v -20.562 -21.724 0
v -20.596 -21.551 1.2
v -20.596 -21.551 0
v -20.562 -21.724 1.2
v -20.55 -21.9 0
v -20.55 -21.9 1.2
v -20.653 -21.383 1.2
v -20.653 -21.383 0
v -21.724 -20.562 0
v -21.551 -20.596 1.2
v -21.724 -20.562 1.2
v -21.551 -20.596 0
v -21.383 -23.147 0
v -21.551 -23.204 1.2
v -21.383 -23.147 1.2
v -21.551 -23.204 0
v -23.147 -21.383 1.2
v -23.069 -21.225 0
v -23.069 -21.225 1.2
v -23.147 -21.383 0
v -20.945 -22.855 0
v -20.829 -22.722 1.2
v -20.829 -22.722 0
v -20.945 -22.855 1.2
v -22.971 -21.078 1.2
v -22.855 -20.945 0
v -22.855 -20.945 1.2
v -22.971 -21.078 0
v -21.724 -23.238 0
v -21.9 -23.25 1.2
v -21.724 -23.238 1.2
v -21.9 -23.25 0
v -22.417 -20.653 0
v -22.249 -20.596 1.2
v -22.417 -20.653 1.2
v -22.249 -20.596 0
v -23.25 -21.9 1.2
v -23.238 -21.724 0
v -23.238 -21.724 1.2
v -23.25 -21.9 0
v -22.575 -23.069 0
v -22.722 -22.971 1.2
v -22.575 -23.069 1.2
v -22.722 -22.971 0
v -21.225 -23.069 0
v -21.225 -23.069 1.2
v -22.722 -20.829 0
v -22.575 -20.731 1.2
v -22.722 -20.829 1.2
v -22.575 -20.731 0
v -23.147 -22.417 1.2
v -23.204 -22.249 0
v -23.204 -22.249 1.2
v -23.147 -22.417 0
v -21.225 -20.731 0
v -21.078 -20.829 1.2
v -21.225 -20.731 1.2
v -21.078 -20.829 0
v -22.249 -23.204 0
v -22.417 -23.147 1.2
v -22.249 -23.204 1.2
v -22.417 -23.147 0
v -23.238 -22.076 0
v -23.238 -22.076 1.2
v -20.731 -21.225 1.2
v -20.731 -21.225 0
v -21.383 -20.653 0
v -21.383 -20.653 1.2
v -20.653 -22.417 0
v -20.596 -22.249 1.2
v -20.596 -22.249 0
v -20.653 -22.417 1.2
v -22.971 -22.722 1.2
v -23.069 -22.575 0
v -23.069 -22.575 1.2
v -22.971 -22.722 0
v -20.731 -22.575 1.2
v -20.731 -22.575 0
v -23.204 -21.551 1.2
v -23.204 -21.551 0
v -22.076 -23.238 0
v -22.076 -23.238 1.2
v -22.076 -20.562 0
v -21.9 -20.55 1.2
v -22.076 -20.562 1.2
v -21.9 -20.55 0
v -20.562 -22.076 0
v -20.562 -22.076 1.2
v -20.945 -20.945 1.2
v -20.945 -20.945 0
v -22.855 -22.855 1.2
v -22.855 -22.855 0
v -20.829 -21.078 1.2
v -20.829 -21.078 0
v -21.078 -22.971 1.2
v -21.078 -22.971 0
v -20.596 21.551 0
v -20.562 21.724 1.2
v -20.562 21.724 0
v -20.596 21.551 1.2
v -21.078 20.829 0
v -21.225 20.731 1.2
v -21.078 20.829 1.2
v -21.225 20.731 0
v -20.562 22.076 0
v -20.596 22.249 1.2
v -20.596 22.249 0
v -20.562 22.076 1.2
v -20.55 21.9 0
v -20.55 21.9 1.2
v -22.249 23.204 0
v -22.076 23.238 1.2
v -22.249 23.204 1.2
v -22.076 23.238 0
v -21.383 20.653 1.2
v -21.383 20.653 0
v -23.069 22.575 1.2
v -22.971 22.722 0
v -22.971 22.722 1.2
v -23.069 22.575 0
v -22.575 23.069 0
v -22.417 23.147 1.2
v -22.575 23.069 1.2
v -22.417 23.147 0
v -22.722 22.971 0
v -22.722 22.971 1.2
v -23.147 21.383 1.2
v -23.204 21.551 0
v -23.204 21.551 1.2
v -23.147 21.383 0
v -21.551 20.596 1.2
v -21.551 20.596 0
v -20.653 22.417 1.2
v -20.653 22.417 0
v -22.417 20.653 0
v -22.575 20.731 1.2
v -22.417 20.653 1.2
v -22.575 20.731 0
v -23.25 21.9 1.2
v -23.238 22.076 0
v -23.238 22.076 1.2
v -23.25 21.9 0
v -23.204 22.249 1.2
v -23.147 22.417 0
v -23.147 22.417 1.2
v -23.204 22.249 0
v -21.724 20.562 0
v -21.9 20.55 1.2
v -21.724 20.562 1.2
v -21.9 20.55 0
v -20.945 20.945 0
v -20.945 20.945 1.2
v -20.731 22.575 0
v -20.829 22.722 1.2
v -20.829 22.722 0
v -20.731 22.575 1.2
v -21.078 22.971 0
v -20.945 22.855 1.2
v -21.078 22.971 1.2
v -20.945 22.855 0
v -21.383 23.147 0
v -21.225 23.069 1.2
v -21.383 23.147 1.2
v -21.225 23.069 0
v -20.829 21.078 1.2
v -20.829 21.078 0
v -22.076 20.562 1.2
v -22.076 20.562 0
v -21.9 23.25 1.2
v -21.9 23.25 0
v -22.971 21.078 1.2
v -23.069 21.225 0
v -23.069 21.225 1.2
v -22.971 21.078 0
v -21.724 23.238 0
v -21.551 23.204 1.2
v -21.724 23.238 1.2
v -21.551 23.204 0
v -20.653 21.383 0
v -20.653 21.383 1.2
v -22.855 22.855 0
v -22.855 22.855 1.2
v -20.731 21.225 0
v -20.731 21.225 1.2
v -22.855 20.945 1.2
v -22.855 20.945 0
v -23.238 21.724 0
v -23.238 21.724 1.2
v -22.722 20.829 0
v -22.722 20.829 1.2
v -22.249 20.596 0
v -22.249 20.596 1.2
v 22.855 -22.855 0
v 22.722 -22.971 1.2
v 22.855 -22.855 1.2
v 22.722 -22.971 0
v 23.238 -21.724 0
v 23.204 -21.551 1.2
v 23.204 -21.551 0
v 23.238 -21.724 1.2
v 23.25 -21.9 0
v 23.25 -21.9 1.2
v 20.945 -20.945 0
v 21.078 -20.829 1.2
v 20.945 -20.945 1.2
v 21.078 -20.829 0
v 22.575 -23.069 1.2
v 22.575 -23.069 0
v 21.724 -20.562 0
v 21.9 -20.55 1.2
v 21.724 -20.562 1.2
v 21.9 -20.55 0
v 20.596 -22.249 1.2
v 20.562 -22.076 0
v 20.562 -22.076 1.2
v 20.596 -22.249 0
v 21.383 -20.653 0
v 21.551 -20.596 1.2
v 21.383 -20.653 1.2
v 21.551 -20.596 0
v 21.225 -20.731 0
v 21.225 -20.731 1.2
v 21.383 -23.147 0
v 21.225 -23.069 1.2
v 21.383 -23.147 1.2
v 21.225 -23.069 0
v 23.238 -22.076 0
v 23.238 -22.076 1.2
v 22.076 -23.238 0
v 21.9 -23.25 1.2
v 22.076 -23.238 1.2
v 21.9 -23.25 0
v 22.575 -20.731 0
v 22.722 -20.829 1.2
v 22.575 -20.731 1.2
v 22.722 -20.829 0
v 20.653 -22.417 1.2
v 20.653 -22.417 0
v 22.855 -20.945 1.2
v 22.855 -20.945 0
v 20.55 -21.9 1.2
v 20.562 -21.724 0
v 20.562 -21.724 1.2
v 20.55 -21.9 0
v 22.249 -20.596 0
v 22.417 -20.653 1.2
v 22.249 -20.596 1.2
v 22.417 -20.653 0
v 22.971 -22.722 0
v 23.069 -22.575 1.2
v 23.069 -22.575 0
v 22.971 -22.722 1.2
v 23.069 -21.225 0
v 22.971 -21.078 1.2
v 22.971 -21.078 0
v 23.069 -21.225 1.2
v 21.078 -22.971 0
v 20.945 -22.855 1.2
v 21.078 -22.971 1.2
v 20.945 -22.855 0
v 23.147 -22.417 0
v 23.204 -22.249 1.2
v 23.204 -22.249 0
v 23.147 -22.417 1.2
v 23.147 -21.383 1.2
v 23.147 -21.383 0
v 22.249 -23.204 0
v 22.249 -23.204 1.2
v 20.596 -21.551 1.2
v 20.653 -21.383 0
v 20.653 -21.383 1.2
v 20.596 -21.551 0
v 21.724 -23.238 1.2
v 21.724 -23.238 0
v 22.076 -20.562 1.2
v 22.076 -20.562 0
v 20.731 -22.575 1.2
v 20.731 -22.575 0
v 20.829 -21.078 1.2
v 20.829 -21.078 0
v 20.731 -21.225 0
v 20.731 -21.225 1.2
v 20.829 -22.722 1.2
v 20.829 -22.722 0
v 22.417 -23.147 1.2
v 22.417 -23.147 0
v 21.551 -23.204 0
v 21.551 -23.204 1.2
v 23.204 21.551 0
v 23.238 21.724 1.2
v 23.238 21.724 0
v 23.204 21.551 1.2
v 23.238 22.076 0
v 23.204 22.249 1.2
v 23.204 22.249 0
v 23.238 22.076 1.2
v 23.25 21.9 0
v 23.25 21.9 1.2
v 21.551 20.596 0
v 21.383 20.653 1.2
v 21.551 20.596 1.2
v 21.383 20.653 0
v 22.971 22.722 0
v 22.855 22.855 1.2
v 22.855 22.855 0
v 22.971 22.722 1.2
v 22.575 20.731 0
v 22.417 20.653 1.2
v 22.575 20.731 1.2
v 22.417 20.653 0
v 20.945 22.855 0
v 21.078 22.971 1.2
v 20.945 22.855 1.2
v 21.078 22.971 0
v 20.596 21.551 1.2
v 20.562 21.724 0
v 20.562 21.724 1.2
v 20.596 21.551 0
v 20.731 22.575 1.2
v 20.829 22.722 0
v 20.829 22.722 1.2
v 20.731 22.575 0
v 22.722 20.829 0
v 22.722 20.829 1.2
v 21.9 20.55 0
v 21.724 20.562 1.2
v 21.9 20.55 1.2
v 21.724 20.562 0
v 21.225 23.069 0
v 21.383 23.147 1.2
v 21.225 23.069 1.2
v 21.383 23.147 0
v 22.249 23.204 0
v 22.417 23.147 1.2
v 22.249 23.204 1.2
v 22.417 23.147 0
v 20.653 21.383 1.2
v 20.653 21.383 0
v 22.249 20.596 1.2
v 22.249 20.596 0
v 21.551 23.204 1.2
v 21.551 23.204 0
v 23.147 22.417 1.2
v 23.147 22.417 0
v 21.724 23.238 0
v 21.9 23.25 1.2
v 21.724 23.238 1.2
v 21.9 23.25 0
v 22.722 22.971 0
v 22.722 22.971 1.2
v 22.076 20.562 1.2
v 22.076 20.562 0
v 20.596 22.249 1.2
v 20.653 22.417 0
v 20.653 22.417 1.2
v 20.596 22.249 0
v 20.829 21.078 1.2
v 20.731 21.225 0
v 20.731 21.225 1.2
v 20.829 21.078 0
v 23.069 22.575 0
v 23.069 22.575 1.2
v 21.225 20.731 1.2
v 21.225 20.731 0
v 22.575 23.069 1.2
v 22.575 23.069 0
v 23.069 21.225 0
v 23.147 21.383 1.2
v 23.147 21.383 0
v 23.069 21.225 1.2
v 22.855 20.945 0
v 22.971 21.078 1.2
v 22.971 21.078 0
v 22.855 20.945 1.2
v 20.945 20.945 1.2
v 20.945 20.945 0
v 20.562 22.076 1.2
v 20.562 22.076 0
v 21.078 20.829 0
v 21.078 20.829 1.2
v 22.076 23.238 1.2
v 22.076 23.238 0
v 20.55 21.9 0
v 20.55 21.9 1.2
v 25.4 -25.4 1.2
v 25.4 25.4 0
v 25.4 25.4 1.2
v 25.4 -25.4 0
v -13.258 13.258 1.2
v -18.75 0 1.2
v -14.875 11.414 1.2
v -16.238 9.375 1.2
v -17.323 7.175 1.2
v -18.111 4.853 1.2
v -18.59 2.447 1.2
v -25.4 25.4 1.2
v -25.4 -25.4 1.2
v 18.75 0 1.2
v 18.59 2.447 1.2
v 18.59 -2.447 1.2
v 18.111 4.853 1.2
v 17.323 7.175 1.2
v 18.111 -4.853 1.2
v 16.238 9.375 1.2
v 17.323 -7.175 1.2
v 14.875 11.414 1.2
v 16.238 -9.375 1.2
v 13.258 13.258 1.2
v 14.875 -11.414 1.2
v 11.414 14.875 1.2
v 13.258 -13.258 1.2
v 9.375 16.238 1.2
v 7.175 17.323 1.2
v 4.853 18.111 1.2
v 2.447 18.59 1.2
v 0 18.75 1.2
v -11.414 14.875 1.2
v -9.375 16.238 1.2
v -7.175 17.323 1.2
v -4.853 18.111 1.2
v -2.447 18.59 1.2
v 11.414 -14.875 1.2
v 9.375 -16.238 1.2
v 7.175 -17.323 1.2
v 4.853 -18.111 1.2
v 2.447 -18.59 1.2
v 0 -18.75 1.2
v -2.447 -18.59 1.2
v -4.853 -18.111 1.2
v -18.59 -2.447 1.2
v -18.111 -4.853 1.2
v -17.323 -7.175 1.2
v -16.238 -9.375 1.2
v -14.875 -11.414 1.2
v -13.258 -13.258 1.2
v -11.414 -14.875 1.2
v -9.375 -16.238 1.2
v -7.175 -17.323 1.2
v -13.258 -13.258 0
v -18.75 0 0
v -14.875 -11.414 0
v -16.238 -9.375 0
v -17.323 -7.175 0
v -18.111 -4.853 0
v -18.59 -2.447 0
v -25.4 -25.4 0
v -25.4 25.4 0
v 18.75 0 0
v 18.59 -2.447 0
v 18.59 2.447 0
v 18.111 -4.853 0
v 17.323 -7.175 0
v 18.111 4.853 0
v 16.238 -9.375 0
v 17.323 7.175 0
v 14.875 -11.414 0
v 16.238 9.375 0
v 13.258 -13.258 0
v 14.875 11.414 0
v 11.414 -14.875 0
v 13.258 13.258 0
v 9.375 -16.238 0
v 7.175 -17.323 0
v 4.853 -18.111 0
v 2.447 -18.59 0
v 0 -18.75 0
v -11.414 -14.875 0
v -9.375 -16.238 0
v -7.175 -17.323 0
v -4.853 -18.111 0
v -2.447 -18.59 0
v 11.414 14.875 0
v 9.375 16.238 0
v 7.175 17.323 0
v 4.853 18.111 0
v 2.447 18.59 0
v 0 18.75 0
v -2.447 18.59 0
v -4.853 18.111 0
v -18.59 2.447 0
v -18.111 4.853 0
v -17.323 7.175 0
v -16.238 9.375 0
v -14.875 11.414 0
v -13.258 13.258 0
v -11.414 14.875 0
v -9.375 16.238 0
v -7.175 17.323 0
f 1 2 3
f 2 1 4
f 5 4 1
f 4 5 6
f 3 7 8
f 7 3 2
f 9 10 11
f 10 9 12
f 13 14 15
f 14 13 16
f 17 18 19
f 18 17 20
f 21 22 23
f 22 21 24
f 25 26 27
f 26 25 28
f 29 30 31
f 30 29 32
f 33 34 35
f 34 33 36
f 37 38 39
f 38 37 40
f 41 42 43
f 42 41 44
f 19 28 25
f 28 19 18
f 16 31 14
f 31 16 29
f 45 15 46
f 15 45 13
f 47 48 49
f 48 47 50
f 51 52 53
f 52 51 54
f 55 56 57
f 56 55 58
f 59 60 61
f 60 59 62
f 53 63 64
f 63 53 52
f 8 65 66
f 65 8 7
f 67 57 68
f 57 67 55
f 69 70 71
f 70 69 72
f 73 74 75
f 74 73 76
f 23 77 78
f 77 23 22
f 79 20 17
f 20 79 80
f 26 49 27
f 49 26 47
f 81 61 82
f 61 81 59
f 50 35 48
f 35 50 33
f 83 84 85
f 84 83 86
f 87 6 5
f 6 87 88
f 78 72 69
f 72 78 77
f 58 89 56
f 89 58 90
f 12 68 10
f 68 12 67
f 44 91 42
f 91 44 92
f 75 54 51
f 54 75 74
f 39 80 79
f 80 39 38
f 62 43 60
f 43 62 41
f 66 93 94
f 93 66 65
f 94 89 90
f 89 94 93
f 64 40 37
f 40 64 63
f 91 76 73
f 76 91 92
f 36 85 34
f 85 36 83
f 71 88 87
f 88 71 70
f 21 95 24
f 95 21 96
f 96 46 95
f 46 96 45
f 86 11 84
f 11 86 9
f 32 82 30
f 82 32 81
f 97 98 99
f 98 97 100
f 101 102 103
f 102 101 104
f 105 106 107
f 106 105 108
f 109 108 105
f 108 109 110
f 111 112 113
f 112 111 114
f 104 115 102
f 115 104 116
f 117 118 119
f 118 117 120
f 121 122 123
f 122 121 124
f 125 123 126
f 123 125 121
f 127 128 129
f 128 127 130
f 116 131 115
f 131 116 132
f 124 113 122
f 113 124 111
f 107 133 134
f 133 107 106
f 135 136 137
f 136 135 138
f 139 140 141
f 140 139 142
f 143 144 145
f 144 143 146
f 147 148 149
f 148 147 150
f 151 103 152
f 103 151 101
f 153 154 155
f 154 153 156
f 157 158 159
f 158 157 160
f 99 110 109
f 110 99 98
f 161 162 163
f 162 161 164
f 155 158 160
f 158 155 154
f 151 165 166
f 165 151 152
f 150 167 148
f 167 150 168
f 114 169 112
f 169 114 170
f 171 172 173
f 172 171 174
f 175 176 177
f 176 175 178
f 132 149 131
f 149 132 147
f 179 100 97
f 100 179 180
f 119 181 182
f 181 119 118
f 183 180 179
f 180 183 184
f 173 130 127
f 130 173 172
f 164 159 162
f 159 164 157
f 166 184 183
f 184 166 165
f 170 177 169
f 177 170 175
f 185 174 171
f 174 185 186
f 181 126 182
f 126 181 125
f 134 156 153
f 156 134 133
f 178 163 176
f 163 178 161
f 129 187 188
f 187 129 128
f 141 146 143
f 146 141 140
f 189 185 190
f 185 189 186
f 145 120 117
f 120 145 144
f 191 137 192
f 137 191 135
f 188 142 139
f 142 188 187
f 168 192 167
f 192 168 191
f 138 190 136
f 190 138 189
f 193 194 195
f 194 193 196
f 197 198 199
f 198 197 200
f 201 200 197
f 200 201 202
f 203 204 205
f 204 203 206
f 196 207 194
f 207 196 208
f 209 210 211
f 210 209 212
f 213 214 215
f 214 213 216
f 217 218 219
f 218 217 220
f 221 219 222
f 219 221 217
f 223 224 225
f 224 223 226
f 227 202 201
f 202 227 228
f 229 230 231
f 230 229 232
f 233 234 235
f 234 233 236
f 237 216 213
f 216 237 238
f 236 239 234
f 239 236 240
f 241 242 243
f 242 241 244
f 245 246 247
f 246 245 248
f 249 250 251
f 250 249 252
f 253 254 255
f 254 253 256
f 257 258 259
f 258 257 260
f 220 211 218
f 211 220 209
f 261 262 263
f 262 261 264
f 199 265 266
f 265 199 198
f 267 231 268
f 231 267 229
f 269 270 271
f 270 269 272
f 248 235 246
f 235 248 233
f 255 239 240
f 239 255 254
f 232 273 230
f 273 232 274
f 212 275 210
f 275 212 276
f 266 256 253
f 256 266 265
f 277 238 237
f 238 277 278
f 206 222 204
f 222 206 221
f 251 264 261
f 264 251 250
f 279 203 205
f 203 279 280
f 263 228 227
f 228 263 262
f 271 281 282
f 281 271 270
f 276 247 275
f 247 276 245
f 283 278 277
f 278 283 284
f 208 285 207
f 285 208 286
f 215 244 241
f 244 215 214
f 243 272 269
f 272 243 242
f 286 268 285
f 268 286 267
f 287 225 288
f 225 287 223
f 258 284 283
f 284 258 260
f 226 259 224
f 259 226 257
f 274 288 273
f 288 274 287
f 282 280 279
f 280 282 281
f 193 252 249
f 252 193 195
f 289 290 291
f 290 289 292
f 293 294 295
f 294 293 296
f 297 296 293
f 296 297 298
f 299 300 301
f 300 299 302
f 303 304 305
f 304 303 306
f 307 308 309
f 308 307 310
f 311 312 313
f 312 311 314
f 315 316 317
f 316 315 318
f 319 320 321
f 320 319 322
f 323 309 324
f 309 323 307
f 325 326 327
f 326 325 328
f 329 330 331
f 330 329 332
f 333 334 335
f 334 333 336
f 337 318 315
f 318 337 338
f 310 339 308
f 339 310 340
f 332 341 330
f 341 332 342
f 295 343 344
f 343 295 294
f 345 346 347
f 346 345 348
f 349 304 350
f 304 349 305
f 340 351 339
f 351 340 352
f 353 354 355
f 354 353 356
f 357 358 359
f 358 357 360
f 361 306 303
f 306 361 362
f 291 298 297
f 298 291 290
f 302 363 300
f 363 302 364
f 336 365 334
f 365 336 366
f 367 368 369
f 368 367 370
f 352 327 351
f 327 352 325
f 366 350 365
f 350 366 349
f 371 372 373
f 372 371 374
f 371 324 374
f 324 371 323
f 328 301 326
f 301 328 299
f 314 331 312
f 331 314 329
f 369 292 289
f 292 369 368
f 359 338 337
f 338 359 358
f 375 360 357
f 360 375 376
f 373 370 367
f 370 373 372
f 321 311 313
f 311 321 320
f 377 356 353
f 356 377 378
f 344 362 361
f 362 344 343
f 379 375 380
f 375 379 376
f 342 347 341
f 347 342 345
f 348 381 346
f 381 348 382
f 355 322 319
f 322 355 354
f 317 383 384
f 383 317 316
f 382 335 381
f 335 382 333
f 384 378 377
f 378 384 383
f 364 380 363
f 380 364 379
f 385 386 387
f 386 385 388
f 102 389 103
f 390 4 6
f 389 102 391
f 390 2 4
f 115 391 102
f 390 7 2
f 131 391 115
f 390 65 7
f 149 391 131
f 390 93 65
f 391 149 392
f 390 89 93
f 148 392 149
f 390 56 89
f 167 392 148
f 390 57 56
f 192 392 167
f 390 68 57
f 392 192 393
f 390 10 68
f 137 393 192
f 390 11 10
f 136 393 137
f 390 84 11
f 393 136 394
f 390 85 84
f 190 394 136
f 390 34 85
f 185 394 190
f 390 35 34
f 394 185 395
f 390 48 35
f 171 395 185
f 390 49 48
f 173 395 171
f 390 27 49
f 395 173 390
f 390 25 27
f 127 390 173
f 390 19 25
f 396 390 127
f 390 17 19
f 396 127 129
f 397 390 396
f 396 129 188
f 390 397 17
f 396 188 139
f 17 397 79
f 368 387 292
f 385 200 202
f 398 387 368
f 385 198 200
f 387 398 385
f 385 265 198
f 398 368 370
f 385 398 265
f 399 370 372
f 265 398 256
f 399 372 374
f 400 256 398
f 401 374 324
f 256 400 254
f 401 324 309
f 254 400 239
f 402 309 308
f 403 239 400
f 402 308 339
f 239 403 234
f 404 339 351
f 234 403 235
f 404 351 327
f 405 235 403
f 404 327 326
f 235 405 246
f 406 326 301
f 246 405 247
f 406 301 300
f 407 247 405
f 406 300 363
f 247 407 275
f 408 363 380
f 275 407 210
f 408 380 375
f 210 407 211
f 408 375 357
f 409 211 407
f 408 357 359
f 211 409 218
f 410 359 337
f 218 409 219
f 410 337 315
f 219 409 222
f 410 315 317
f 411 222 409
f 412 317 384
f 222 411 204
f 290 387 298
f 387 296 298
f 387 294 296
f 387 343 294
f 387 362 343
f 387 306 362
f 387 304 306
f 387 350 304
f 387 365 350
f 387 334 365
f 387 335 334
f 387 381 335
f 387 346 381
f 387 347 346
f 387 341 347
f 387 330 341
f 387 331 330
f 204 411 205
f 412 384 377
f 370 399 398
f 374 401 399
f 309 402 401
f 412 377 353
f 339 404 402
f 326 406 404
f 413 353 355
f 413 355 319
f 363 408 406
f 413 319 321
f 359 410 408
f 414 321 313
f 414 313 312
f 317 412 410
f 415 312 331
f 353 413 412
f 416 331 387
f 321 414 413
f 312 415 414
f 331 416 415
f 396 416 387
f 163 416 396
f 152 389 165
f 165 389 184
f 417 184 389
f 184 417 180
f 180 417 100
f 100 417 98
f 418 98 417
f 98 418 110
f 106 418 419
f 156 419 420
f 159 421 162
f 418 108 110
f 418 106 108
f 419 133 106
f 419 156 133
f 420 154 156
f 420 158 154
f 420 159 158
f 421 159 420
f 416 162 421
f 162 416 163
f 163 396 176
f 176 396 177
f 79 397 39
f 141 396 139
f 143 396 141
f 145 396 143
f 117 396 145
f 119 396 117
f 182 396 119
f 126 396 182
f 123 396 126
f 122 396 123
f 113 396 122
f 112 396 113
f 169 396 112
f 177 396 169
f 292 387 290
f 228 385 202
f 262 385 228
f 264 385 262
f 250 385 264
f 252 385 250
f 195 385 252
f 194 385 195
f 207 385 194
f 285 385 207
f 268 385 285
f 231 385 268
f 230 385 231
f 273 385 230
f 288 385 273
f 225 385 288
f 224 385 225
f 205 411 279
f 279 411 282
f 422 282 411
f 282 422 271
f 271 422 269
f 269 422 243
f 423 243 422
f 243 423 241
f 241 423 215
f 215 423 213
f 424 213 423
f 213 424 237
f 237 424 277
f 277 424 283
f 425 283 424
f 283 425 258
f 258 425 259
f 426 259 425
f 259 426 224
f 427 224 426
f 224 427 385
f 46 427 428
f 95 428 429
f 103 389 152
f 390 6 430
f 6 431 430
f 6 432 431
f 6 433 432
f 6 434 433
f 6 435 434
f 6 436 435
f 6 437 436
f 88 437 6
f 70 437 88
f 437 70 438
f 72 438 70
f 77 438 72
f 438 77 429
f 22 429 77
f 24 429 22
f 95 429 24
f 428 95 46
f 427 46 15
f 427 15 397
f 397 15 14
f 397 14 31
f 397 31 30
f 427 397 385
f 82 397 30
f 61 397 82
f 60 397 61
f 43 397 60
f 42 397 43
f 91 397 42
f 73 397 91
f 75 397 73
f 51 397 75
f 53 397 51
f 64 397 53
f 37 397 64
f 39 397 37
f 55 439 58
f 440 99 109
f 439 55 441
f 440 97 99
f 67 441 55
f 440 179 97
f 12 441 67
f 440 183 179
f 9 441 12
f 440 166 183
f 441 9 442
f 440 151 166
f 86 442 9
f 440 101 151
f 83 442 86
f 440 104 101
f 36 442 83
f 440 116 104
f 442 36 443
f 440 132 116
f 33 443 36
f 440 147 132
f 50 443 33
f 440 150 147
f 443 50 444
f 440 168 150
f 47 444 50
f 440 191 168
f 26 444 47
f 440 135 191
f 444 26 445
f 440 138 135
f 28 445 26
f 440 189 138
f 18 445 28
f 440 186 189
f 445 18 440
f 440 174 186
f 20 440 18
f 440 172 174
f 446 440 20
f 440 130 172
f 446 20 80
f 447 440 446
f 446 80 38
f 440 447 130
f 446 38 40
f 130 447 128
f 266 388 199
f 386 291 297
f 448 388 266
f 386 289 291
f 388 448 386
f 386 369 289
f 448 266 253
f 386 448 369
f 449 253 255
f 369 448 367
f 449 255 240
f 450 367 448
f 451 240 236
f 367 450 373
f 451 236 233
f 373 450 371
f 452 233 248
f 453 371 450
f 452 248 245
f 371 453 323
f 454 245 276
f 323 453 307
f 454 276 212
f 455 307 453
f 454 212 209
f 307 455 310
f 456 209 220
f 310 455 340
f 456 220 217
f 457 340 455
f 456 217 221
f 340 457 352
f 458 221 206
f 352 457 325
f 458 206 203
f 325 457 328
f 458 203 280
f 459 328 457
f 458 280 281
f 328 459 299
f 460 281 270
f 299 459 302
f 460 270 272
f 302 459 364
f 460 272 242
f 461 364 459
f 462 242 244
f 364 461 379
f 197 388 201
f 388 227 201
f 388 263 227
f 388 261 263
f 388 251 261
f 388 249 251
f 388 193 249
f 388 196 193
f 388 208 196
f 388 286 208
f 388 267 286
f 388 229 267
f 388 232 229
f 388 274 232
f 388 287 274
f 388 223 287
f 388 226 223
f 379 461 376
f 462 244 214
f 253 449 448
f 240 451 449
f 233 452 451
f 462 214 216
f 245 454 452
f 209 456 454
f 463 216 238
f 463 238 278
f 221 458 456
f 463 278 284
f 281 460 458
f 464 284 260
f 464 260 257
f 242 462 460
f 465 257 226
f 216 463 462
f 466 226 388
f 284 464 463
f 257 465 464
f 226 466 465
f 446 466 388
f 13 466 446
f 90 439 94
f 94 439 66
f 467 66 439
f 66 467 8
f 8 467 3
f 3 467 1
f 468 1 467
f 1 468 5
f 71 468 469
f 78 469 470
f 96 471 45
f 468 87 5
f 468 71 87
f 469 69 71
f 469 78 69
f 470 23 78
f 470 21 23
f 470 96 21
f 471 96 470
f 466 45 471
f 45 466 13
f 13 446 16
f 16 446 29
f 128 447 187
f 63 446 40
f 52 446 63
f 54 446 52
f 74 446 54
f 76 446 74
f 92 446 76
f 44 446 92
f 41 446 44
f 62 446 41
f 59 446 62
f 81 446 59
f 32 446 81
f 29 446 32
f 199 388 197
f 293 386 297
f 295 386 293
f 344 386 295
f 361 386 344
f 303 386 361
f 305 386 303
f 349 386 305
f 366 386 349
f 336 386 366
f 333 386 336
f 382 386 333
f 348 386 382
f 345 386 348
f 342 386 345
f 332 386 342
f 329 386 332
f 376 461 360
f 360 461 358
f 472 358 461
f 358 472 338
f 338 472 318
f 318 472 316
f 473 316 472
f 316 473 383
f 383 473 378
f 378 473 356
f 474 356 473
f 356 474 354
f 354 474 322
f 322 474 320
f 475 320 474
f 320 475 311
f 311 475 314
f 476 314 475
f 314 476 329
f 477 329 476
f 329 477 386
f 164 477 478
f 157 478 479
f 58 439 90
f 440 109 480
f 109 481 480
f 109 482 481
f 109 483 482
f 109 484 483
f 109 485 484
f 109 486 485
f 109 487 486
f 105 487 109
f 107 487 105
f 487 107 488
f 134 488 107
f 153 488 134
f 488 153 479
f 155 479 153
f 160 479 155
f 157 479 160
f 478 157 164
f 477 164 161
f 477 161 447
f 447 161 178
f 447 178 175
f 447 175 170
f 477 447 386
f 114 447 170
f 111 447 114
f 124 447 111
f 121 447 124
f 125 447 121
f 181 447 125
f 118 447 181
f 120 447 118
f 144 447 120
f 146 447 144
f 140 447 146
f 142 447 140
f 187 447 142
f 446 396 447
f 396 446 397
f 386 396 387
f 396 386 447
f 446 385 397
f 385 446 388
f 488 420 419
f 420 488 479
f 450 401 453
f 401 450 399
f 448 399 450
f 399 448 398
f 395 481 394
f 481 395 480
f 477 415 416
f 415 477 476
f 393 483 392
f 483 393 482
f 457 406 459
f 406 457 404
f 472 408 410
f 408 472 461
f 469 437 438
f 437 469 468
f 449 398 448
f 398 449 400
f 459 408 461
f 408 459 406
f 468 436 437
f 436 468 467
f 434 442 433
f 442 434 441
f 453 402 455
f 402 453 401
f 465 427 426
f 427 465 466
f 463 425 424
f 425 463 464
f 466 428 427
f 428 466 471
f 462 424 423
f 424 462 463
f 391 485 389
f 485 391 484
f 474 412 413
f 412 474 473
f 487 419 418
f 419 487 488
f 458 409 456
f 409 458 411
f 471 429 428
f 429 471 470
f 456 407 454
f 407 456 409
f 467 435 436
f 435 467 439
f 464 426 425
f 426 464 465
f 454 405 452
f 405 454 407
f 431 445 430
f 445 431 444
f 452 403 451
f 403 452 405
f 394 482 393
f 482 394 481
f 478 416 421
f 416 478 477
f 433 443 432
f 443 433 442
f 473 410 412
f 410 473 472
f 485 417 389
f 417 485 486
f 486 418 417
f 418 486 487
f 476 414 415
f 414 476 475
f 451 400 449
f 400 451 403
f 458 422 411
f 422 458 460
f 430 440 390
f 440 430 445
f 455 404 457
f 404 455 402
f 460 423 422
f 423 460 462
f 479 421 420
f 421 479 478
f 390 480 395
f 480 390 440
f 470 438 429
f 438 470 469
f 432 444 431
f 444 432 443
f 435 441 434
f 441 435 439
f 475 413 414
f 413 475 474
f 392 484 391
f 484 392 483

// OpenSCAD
// Radxa Cubie A7S: 40 mm fan bracket (parametric).  Units: mm.
//
// Holds a 40 x 40 x 10 mm fan 15 mm above the SoC heatsink, on the board's own four mounting holes (no glue, no drilling).
// "gauge" is a 10-minute thin plate to check the four hole positions on YOUR board before printing the bracket.
//
// Board data (50.8 x 50.8 mm board, four dia 2.7 holes on a 43.8 mm square, 3.5 mm from the edges): Radxa Cubie A7S product
// brief, "Mechanical Specification" (dl.radxa.com/cubie/a7s/docs/radxa_cubie_a7s_product_brief.pdf).  Not affiliated with Radxa.
// Fan data: 40 x 40 x 10 mm, mounting holes 32 x 32 mm, M3 screws.  Tested with the GeeekPi 4010 5 V fan (M3 x 16 screws + nuts).
//
// Printing: the plate lies flat on the bed and the posts point up (flip = true).  Use PETG or ASA for anything left on a running
// board: PLA/PLA+ softens at roughly 55-65 C and the chip area has been 66-80 C without a fan.  No supports needed.
// Hardware: 4 x M2.5 screws, 25 mm (+ nuts and washers) for the board; the fan's own 4 x M3 x 16 screws and nuts.
//
// STATUS: the gauge was printed and matched a real board; the bracket was printed, assembled and mounted on a real board with
// this heatsink height (heat_top = 9).  10-minute emulator load with the fan at full speed on this bracket: peak 45 C, average 42 C, no
// CPU throttling (without a fan the same load reached 80 C and throttled hard).  The 30 mm variant is untested.
// Designed with AI assistance (Claude, by Anthropic); dimensions checked and the parts printed and fitted by the human author.
// License: CC BY-NC-SA 4.0 (Creative Commons Attribution-NonCommercial-ShareAlike 4.0 International), chosen by the author.
//
// part = "gauge"   -> thin hole-check plate, no posts
// part = "bracket" -> the real part (plate + 4 posts).  With flip = true the plate lies flat on the print bed and the
//                     posts point up, which is the easy way to print it.

part  = "gauge";
flip  = true;       // true: model is turned upside down so the plate sits flat on the print bed

board      = 50.8;
hole_d     = 2.7;   // board mounting holes
hole_off   = 3.5;
hole_pitch = board - 2*hole_off;     // 43.8

// ---- TODO: measure these on the real board ---------------------------------------------------------------------
heat_top = 9;       // board surface to the TOP of the fin tips on the SoC heatsink (7 mm fins + chip + pad; ~estimate)
gap      = 6;       // clear gap between the fin tips and the fan underside  (heat_top + gap = 15 mm total)
fx = 0;  fy = 0;    // fan center relative to the BOARD center (put it over the SoC heatsink center)
// -----------------------------------------------------------------------------------------------------------------

post_od  = 6;       // post outside diameter
bore_d   = 2.7;     // M2.5 screw clearance
head_d   = 5.5;     // M2.5 screw head recess in the plate top
head_dep = 1.5;
plate_t  = 4;       // thick enough for the M3 nut pockets under the fan holes
post_h   = heat_top + gap;           // board surface to the underside of the plate

fan       = 40;     // fan frame size (use 30 for a 30 mm fan, with fan_pitch = 24)
fan_pitch = 32;     // fan mounting holes
fan_hole  = 3.2;    // clearance for the fan's M3 machine screws (they come with a hex nut each)
nut_af    = 5.7;    // M3 hex nut across flats (+ a little play)
nut_dep   = 2.6;    // pocket depth under the plate (an M3 nut is 2.4 mm thick)
open_d    = (fan >= 40) ? fan - 2.5 : fan - 4;   // airflow opening: 37.5 mm for a 40 mm fan (keeps a ~1 mm wall to the nut pockets), 26 mm for 30
$fn = 48;

// plate outline = board outline, grown to cover the fan (+ a 2 mm rim) if the fan overhangs
px0 = min(-board/2, fx - fan/2 - 2);  px1 = max(board/2, fx + fan/2 + 2);
py0 = min(-board/2, fy - fan/2 - 2);  py1 = max(board/2, fy + fan/2 + 2);

module corners() { for (sx=[-1,1], sy=[-1,1]) translate([sx*hole_pitch/2, sy*hole_pitch/2, 0]) children(); }

module bracket() {
    difference() {
        union() {
            corners() cylinder(d=post_od, h=post_h + plate_t);
            translate([px0, py0, post_h]) cube([px1 - px0, py1 - py0, plate_t]);
        }
        corners() translate([0,0,-1]) cylinder(d=bore_d, h=post_h + plate_t + 2);               // screw bores
        corners() translate([0,0,post_h + plate_t - head_dep]) cylinder(d=head_d, h=head_dep + 1); // head recesses
        translate([fx, fy, post_h - 1]) cylinder(d=open_d, h=plate_t + 2);                       // airflow opening
        for (sx=[-1,1], sy=[-1,1]) {                                                              // fan screw holes + nut pockets
            translate([fx + sx*fan_pitch/2, fy + sy*fan_pitch/2, post_h - 1]) cylinder(d=fan_hole, h=plate_t + 2);
            translate([fx + sx*fan_pitch/2, fy + sy*fan_pitch/2, post_h - 0.01]) rotate([0, 0, 15*sx*sy]) cylinder(d=nut_af/cos(30), h=nut_dep + 0.01, $fn=6);   // a flat side faces the window
        }
    }
}

module gauge() {
    difference() {
        translate([-board/2, -board/2, 0]) cube([board, board, 1.2]);
        corners() translate([0,0,-1]) cylinder(d=hole_d, h=4);
        translate([fx, fy, -1]) cylinder(d=open_d, h=4);
    }
}

if (part == "gauge") gauge();
else if (flip) translate([0,0,post_h + plate_t]) rotate([180,0,0]) bracket();
else bracket();
